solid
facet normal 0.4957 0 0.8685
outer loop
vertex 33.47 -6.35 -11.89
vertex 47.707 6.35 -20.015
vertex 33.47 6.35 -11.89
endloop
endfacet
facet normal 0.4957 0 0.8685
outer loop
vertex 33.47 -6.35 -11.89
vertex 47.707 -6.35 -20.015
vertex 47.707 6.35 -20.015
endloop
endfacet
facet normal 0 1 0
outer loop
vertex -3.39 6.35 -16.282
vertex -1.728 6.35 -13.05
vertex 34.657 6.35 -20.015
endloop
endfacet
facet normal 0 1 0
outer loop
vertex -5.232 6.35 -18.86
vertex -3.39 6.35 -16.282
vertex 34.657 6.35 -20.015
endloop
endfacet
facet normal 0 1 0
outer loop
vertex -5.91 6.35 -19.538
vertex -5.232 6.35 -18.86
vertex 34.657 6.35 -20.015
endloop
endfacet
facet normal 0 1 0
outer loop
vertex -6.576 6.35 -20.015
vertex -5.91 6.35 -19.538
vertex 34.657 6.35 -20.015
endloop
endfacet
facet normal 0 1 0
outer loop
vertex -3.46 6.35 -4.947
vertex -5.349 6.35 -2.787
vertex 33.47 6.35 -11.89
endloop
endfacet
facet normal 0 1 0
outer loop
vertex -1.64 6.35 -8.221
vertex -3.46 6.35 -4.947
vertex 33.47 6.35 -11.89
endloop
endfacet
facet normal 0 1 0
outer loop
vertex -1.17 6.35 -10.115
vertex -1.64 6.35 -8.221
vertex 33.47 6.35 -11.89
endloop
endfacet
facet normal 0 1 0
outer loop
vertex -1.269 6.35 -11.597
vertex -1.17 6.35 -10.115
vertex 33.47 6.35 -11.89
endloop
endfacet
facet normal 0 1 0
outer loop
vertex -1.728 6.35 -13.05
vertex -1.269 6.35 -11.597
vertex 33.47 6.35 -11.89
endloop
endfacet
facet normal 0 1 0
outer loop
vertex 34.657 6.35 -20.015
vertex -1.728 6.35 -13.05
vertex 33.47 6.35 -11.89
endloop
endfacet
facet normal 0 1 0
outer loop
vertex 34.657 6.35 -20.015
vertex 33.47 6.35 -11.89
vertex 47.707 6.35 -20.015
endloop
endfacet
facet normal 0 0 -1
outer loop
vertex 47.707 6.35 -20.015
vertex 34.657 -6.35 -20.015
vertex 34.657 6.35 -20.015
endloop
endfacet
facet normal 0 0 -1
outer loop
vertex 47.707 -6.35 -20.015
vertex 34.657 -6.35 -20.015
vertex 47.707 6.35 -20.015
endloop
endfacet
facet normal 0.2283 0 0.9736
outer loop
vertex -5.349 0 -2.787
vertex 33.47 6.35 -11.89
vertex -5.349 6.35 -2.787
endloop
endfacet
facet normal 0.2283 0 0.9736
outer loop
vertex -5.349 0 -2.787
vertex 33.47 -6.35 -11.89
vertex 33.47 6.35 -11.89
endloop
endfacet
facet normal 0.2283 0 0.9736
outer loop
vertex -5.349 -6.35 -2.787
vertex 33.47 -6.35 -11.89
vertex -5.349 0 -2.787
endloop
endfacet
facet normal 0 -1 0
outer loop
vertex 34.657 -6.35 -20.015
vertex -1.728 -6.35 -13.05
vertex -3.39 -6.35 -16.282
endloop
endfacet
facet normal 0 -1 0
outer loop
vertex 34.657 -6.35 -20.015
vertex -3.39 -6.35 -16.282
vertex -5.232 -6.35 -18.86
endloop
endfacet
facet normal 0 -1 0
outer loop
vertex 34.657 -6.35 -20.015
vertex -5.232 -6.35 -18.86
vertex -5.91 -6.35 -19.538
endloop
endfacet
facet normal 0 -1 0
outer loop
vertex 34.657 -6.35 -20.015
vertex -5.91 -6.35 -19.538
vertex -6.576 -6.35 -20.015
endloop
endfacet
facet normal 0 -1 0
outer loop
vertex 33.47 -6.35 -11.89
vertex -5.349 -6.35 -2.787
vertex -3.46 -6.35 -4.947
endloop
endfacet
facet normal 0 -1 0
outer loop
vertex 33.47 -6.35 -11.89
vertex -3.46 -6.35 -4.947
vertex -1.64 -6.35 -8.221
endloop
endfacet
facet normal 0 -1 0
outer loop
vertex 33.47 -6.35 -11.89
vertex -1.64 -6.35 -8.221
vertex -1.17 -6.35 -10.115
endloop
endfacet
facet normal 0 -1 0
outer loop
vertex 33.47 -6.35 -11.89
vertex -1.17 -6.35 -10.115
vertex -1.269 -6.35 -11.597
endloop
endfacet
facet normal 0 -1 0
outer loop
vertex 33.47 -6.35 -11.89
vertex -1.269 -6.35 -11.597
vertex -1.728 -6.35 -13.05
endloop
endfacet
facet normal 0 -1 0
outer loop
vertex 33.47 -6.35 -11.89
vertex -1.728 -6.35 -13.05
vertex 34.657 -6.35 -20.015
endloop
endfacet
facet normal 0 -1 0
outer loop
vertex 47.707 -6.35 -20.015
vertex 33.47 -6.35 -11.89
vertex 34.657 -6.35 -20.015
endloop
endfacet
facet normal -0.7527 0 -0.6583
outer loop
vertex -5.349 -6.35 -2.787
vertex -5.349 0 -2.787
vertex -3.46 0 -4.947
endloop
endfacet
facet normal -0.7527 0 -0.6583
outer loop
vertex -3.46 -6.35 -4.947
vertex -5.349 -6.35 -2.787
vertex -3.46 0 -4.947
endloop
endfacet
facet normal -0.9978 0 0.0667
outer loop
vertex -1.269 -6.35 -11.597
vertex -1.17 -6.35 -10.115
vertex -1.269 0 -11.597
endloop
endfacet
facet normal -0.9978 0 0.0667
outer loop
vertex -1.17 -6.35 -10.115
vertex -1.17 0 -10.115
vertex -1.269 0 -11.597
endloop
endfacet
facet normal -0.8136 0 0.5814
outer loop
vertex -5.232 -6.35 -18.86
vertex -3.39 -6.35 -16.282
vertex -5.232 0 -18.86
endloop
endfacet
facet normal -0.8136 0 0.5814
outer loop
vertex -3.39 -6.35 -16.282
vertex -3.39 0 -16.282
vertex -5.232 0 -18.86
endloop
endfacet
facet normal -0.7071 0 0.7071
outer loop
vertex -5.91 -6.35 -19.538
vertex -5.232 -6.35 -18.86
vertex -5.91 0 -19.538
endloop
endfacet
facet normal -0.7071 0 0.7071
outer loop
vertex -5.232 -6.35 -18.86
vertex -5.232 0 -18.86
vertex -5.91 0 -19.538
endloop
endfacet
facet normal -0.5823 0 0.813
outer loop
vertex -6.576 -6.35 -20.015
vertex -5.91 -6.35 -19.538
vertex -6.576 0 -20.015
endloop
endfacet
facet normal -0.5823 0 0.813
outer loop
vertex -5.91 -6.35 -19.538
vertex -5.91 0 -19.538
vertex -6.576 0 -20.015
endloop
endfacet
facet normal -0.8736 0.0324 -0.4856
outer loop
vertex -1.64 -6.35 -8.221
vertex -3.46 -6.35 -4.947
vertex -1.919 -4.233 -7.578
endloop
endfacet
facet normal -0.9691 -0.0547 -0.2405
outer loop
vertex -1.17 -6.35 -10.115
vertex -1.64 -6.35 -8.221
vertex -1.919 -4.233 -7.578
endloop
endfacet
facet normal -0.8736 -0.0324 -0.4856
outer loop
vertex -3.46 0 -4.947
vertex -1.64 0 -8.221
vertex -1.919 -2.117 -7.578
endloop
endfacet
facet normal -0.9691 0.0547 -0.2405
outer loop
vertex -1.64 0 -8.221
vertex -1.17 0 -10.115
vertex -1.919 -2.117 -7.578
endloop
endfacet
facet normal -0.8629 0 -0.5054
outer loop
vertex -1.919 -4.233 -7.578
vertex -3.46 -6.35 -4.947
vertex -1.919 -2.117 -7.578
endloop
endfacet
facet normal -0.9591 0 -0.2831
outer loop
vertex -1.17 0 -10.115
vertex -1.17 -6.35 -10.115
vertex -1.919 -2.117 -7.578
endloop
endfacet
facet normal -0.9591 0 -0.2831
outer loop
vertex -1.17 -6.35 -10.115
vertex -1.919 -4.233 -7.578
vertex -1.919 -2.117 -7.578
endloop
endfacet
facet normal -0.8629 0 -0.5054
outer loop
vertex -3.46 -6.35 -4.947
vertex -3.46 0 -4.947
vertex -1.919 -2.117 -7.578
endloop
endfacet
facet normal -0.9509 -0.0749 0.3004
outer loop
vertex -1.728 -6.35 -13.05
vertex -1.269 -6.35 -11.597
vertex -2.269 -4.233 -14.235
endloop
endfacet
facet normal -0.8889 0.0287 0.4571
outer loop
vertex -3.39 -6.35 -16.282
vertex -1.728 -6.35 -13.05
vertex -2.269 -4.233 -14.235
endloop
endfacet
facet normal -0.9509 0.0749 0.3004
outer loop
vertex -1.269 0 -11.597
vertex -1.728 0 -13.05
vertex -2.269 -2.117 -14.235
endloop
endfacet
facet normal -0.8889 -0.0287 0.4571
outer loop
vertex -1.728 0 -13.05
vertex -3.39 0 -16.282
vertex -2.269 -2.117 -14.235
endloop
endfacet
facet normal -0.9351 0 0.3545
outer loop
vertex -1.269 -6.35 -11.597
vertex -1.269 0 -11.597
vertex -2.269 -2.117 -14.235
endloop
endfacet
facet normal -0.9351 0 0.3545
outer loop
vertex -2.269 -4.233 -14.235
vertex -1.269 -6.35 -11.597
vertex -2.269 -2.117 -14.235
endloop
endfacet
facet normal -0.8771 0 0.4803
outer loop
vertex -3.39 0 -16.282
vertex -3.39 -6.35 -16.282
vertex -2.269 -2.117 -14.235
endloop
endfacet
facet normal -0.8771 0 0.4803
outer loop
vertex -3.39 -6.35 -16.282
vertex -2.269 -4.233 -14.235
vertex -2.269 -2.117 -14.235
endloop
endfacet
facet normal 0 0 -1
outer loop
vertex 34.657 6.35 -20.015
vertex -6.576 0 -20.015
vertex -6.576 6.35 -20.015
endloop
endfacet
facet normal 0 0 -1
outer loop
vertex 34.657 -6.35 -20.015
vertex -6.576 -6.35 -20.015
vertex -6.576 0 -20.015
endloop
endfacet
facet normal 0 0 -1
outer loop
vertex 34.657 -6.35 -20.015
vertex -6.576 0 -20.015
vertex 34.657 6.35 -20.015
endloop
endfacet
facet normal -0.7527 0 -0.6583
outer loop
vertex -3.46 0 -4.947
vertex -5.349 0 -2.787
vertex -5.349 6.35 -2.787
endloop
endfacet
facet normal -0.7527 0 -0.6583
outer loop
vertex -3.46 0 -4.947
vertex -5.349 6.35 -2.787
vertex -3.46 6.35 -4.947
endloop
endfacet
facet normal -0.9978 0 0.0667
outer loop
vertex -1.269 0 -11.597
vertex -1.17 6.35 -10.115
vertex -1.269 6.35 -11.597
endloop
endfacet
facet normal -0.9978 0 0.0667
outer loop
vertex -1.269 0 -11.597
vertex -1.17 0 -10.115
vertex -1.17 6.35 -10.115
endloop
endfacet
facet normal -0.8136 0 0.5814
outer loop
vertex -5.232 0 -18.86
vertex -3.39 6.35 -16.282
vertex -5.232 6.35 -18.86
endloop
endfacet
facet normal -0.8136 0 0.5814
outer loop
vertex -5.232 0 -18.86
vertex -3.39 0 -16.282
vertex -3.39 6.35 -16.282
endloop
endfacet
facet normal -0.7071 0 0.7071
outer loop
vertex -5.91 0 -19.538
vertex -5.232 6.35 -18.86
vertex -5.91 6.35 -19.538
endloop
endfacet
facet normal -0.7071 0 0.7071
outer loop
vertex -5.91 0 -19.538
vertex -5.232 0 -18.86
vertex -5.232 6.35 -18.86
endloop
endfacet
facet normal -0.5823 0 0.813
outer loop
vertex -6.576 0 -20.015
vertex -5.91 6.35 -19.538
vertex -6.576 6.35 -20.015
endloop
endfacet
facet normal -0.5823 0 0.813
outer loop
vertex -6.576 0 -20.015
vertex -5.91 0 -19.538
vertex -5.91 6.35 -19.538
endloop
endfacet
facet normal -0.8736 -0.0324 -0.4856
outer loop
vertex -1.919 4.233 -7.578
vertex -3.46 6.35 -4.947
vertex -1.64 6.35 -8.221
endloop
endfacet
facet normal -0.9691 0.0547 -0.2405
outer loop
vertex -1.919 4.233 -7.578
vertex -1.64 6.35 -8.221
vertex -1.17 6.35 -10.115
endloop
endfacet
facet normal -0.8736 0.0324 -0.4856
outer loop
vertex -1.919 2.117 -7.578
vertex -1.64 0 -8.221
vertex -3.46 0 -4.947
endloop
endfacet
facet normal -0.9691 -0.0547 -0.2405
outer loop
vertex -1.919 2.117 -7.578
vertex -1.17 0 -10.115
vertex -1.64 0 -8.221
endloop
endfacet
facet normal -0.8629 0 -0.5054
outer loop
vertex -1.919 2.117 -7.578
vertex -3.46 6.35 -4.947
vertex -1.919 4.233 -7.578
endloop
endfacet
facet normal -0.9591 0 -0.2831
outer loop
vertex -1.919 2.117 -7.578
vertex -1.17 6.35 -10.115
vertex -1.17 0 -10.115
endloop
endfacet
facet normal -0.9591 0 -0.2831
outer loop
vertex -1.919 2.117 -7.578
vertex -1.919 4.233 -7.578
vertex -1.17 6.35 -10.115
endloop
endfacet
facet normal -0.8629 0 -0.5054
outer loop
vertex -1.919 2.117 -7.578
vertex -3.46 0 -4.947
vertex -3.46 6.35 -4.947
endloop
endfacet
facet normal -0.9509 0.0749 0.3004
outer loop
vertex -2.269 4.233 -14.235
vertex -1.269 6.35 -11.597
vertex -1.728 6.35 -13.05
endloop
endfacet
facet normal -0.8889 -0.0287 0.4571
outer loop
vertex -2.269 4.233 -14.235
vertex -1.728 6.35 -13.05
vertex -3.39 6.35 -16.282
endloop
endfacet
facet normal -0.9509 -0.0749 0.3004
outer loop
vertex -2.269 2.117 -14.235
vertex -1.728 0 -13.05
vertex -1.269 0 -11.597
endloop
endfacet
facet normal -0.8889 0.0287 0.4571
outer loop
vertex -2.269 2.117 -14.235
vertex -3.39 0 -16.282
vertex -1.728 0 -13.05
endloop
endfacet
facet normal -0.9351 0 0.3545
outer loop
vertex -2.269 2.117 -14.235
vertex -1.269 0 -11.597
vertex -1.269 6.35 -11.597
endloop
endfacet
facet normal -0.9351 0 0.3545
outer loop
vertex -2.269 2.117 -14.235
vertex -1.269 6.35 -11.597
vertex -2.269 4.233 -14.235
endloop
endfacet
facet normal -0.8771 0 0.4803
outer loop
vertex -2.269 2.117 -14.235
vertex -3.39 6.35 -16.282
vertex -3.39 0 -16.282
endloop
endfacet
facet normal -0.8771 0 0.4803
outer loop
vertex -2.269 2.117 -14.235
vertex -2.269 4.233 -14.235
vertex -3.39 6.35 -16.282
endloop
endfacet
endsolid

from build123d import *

# Parameters (mm, degrees)
F1_DEPTH = 6.35


with BuildPart() as f1:
    # F0 (on Front) → F1 (new body, symmetric)
    with BuildSketch(Plane.XZ):
        with BuildLine():
            add(Edge.make_bspline(
                [(-5.3486366817, -2.7874862403), (-4.0104451202, -3.9435804676), (-0.5819417824, -9.125605789), (-1.1784647642, -12.8832361111), (-5.0637980722, -19.1799623301), (-6.5756122832, -20.0153414606)],
                knots=[0.0969603728, 0.0969603728, 0.0969603728, 0.0969603728, 0.2285584347, 0.4344976174, 0.602314147, 0.602314147, 0.602314147, 0.602314147], degree=3))
            Line((-6.5756122832, -20.0153414606), (34.656740726, -20.0153416228))
            Line((34.656740726, -20.0153416228), (47.7068386995, -20.0153416742))
            Line((47.7068386995, -20.0153416742), (33.4700680664, -11.8898041731))
            Line((33.4700680664, -11.8898041731), (-5.3486366817, -2.7874862403))
        make_face()
    extrude(amount=F1_DEPTH, both=True)


solid = f1.part
